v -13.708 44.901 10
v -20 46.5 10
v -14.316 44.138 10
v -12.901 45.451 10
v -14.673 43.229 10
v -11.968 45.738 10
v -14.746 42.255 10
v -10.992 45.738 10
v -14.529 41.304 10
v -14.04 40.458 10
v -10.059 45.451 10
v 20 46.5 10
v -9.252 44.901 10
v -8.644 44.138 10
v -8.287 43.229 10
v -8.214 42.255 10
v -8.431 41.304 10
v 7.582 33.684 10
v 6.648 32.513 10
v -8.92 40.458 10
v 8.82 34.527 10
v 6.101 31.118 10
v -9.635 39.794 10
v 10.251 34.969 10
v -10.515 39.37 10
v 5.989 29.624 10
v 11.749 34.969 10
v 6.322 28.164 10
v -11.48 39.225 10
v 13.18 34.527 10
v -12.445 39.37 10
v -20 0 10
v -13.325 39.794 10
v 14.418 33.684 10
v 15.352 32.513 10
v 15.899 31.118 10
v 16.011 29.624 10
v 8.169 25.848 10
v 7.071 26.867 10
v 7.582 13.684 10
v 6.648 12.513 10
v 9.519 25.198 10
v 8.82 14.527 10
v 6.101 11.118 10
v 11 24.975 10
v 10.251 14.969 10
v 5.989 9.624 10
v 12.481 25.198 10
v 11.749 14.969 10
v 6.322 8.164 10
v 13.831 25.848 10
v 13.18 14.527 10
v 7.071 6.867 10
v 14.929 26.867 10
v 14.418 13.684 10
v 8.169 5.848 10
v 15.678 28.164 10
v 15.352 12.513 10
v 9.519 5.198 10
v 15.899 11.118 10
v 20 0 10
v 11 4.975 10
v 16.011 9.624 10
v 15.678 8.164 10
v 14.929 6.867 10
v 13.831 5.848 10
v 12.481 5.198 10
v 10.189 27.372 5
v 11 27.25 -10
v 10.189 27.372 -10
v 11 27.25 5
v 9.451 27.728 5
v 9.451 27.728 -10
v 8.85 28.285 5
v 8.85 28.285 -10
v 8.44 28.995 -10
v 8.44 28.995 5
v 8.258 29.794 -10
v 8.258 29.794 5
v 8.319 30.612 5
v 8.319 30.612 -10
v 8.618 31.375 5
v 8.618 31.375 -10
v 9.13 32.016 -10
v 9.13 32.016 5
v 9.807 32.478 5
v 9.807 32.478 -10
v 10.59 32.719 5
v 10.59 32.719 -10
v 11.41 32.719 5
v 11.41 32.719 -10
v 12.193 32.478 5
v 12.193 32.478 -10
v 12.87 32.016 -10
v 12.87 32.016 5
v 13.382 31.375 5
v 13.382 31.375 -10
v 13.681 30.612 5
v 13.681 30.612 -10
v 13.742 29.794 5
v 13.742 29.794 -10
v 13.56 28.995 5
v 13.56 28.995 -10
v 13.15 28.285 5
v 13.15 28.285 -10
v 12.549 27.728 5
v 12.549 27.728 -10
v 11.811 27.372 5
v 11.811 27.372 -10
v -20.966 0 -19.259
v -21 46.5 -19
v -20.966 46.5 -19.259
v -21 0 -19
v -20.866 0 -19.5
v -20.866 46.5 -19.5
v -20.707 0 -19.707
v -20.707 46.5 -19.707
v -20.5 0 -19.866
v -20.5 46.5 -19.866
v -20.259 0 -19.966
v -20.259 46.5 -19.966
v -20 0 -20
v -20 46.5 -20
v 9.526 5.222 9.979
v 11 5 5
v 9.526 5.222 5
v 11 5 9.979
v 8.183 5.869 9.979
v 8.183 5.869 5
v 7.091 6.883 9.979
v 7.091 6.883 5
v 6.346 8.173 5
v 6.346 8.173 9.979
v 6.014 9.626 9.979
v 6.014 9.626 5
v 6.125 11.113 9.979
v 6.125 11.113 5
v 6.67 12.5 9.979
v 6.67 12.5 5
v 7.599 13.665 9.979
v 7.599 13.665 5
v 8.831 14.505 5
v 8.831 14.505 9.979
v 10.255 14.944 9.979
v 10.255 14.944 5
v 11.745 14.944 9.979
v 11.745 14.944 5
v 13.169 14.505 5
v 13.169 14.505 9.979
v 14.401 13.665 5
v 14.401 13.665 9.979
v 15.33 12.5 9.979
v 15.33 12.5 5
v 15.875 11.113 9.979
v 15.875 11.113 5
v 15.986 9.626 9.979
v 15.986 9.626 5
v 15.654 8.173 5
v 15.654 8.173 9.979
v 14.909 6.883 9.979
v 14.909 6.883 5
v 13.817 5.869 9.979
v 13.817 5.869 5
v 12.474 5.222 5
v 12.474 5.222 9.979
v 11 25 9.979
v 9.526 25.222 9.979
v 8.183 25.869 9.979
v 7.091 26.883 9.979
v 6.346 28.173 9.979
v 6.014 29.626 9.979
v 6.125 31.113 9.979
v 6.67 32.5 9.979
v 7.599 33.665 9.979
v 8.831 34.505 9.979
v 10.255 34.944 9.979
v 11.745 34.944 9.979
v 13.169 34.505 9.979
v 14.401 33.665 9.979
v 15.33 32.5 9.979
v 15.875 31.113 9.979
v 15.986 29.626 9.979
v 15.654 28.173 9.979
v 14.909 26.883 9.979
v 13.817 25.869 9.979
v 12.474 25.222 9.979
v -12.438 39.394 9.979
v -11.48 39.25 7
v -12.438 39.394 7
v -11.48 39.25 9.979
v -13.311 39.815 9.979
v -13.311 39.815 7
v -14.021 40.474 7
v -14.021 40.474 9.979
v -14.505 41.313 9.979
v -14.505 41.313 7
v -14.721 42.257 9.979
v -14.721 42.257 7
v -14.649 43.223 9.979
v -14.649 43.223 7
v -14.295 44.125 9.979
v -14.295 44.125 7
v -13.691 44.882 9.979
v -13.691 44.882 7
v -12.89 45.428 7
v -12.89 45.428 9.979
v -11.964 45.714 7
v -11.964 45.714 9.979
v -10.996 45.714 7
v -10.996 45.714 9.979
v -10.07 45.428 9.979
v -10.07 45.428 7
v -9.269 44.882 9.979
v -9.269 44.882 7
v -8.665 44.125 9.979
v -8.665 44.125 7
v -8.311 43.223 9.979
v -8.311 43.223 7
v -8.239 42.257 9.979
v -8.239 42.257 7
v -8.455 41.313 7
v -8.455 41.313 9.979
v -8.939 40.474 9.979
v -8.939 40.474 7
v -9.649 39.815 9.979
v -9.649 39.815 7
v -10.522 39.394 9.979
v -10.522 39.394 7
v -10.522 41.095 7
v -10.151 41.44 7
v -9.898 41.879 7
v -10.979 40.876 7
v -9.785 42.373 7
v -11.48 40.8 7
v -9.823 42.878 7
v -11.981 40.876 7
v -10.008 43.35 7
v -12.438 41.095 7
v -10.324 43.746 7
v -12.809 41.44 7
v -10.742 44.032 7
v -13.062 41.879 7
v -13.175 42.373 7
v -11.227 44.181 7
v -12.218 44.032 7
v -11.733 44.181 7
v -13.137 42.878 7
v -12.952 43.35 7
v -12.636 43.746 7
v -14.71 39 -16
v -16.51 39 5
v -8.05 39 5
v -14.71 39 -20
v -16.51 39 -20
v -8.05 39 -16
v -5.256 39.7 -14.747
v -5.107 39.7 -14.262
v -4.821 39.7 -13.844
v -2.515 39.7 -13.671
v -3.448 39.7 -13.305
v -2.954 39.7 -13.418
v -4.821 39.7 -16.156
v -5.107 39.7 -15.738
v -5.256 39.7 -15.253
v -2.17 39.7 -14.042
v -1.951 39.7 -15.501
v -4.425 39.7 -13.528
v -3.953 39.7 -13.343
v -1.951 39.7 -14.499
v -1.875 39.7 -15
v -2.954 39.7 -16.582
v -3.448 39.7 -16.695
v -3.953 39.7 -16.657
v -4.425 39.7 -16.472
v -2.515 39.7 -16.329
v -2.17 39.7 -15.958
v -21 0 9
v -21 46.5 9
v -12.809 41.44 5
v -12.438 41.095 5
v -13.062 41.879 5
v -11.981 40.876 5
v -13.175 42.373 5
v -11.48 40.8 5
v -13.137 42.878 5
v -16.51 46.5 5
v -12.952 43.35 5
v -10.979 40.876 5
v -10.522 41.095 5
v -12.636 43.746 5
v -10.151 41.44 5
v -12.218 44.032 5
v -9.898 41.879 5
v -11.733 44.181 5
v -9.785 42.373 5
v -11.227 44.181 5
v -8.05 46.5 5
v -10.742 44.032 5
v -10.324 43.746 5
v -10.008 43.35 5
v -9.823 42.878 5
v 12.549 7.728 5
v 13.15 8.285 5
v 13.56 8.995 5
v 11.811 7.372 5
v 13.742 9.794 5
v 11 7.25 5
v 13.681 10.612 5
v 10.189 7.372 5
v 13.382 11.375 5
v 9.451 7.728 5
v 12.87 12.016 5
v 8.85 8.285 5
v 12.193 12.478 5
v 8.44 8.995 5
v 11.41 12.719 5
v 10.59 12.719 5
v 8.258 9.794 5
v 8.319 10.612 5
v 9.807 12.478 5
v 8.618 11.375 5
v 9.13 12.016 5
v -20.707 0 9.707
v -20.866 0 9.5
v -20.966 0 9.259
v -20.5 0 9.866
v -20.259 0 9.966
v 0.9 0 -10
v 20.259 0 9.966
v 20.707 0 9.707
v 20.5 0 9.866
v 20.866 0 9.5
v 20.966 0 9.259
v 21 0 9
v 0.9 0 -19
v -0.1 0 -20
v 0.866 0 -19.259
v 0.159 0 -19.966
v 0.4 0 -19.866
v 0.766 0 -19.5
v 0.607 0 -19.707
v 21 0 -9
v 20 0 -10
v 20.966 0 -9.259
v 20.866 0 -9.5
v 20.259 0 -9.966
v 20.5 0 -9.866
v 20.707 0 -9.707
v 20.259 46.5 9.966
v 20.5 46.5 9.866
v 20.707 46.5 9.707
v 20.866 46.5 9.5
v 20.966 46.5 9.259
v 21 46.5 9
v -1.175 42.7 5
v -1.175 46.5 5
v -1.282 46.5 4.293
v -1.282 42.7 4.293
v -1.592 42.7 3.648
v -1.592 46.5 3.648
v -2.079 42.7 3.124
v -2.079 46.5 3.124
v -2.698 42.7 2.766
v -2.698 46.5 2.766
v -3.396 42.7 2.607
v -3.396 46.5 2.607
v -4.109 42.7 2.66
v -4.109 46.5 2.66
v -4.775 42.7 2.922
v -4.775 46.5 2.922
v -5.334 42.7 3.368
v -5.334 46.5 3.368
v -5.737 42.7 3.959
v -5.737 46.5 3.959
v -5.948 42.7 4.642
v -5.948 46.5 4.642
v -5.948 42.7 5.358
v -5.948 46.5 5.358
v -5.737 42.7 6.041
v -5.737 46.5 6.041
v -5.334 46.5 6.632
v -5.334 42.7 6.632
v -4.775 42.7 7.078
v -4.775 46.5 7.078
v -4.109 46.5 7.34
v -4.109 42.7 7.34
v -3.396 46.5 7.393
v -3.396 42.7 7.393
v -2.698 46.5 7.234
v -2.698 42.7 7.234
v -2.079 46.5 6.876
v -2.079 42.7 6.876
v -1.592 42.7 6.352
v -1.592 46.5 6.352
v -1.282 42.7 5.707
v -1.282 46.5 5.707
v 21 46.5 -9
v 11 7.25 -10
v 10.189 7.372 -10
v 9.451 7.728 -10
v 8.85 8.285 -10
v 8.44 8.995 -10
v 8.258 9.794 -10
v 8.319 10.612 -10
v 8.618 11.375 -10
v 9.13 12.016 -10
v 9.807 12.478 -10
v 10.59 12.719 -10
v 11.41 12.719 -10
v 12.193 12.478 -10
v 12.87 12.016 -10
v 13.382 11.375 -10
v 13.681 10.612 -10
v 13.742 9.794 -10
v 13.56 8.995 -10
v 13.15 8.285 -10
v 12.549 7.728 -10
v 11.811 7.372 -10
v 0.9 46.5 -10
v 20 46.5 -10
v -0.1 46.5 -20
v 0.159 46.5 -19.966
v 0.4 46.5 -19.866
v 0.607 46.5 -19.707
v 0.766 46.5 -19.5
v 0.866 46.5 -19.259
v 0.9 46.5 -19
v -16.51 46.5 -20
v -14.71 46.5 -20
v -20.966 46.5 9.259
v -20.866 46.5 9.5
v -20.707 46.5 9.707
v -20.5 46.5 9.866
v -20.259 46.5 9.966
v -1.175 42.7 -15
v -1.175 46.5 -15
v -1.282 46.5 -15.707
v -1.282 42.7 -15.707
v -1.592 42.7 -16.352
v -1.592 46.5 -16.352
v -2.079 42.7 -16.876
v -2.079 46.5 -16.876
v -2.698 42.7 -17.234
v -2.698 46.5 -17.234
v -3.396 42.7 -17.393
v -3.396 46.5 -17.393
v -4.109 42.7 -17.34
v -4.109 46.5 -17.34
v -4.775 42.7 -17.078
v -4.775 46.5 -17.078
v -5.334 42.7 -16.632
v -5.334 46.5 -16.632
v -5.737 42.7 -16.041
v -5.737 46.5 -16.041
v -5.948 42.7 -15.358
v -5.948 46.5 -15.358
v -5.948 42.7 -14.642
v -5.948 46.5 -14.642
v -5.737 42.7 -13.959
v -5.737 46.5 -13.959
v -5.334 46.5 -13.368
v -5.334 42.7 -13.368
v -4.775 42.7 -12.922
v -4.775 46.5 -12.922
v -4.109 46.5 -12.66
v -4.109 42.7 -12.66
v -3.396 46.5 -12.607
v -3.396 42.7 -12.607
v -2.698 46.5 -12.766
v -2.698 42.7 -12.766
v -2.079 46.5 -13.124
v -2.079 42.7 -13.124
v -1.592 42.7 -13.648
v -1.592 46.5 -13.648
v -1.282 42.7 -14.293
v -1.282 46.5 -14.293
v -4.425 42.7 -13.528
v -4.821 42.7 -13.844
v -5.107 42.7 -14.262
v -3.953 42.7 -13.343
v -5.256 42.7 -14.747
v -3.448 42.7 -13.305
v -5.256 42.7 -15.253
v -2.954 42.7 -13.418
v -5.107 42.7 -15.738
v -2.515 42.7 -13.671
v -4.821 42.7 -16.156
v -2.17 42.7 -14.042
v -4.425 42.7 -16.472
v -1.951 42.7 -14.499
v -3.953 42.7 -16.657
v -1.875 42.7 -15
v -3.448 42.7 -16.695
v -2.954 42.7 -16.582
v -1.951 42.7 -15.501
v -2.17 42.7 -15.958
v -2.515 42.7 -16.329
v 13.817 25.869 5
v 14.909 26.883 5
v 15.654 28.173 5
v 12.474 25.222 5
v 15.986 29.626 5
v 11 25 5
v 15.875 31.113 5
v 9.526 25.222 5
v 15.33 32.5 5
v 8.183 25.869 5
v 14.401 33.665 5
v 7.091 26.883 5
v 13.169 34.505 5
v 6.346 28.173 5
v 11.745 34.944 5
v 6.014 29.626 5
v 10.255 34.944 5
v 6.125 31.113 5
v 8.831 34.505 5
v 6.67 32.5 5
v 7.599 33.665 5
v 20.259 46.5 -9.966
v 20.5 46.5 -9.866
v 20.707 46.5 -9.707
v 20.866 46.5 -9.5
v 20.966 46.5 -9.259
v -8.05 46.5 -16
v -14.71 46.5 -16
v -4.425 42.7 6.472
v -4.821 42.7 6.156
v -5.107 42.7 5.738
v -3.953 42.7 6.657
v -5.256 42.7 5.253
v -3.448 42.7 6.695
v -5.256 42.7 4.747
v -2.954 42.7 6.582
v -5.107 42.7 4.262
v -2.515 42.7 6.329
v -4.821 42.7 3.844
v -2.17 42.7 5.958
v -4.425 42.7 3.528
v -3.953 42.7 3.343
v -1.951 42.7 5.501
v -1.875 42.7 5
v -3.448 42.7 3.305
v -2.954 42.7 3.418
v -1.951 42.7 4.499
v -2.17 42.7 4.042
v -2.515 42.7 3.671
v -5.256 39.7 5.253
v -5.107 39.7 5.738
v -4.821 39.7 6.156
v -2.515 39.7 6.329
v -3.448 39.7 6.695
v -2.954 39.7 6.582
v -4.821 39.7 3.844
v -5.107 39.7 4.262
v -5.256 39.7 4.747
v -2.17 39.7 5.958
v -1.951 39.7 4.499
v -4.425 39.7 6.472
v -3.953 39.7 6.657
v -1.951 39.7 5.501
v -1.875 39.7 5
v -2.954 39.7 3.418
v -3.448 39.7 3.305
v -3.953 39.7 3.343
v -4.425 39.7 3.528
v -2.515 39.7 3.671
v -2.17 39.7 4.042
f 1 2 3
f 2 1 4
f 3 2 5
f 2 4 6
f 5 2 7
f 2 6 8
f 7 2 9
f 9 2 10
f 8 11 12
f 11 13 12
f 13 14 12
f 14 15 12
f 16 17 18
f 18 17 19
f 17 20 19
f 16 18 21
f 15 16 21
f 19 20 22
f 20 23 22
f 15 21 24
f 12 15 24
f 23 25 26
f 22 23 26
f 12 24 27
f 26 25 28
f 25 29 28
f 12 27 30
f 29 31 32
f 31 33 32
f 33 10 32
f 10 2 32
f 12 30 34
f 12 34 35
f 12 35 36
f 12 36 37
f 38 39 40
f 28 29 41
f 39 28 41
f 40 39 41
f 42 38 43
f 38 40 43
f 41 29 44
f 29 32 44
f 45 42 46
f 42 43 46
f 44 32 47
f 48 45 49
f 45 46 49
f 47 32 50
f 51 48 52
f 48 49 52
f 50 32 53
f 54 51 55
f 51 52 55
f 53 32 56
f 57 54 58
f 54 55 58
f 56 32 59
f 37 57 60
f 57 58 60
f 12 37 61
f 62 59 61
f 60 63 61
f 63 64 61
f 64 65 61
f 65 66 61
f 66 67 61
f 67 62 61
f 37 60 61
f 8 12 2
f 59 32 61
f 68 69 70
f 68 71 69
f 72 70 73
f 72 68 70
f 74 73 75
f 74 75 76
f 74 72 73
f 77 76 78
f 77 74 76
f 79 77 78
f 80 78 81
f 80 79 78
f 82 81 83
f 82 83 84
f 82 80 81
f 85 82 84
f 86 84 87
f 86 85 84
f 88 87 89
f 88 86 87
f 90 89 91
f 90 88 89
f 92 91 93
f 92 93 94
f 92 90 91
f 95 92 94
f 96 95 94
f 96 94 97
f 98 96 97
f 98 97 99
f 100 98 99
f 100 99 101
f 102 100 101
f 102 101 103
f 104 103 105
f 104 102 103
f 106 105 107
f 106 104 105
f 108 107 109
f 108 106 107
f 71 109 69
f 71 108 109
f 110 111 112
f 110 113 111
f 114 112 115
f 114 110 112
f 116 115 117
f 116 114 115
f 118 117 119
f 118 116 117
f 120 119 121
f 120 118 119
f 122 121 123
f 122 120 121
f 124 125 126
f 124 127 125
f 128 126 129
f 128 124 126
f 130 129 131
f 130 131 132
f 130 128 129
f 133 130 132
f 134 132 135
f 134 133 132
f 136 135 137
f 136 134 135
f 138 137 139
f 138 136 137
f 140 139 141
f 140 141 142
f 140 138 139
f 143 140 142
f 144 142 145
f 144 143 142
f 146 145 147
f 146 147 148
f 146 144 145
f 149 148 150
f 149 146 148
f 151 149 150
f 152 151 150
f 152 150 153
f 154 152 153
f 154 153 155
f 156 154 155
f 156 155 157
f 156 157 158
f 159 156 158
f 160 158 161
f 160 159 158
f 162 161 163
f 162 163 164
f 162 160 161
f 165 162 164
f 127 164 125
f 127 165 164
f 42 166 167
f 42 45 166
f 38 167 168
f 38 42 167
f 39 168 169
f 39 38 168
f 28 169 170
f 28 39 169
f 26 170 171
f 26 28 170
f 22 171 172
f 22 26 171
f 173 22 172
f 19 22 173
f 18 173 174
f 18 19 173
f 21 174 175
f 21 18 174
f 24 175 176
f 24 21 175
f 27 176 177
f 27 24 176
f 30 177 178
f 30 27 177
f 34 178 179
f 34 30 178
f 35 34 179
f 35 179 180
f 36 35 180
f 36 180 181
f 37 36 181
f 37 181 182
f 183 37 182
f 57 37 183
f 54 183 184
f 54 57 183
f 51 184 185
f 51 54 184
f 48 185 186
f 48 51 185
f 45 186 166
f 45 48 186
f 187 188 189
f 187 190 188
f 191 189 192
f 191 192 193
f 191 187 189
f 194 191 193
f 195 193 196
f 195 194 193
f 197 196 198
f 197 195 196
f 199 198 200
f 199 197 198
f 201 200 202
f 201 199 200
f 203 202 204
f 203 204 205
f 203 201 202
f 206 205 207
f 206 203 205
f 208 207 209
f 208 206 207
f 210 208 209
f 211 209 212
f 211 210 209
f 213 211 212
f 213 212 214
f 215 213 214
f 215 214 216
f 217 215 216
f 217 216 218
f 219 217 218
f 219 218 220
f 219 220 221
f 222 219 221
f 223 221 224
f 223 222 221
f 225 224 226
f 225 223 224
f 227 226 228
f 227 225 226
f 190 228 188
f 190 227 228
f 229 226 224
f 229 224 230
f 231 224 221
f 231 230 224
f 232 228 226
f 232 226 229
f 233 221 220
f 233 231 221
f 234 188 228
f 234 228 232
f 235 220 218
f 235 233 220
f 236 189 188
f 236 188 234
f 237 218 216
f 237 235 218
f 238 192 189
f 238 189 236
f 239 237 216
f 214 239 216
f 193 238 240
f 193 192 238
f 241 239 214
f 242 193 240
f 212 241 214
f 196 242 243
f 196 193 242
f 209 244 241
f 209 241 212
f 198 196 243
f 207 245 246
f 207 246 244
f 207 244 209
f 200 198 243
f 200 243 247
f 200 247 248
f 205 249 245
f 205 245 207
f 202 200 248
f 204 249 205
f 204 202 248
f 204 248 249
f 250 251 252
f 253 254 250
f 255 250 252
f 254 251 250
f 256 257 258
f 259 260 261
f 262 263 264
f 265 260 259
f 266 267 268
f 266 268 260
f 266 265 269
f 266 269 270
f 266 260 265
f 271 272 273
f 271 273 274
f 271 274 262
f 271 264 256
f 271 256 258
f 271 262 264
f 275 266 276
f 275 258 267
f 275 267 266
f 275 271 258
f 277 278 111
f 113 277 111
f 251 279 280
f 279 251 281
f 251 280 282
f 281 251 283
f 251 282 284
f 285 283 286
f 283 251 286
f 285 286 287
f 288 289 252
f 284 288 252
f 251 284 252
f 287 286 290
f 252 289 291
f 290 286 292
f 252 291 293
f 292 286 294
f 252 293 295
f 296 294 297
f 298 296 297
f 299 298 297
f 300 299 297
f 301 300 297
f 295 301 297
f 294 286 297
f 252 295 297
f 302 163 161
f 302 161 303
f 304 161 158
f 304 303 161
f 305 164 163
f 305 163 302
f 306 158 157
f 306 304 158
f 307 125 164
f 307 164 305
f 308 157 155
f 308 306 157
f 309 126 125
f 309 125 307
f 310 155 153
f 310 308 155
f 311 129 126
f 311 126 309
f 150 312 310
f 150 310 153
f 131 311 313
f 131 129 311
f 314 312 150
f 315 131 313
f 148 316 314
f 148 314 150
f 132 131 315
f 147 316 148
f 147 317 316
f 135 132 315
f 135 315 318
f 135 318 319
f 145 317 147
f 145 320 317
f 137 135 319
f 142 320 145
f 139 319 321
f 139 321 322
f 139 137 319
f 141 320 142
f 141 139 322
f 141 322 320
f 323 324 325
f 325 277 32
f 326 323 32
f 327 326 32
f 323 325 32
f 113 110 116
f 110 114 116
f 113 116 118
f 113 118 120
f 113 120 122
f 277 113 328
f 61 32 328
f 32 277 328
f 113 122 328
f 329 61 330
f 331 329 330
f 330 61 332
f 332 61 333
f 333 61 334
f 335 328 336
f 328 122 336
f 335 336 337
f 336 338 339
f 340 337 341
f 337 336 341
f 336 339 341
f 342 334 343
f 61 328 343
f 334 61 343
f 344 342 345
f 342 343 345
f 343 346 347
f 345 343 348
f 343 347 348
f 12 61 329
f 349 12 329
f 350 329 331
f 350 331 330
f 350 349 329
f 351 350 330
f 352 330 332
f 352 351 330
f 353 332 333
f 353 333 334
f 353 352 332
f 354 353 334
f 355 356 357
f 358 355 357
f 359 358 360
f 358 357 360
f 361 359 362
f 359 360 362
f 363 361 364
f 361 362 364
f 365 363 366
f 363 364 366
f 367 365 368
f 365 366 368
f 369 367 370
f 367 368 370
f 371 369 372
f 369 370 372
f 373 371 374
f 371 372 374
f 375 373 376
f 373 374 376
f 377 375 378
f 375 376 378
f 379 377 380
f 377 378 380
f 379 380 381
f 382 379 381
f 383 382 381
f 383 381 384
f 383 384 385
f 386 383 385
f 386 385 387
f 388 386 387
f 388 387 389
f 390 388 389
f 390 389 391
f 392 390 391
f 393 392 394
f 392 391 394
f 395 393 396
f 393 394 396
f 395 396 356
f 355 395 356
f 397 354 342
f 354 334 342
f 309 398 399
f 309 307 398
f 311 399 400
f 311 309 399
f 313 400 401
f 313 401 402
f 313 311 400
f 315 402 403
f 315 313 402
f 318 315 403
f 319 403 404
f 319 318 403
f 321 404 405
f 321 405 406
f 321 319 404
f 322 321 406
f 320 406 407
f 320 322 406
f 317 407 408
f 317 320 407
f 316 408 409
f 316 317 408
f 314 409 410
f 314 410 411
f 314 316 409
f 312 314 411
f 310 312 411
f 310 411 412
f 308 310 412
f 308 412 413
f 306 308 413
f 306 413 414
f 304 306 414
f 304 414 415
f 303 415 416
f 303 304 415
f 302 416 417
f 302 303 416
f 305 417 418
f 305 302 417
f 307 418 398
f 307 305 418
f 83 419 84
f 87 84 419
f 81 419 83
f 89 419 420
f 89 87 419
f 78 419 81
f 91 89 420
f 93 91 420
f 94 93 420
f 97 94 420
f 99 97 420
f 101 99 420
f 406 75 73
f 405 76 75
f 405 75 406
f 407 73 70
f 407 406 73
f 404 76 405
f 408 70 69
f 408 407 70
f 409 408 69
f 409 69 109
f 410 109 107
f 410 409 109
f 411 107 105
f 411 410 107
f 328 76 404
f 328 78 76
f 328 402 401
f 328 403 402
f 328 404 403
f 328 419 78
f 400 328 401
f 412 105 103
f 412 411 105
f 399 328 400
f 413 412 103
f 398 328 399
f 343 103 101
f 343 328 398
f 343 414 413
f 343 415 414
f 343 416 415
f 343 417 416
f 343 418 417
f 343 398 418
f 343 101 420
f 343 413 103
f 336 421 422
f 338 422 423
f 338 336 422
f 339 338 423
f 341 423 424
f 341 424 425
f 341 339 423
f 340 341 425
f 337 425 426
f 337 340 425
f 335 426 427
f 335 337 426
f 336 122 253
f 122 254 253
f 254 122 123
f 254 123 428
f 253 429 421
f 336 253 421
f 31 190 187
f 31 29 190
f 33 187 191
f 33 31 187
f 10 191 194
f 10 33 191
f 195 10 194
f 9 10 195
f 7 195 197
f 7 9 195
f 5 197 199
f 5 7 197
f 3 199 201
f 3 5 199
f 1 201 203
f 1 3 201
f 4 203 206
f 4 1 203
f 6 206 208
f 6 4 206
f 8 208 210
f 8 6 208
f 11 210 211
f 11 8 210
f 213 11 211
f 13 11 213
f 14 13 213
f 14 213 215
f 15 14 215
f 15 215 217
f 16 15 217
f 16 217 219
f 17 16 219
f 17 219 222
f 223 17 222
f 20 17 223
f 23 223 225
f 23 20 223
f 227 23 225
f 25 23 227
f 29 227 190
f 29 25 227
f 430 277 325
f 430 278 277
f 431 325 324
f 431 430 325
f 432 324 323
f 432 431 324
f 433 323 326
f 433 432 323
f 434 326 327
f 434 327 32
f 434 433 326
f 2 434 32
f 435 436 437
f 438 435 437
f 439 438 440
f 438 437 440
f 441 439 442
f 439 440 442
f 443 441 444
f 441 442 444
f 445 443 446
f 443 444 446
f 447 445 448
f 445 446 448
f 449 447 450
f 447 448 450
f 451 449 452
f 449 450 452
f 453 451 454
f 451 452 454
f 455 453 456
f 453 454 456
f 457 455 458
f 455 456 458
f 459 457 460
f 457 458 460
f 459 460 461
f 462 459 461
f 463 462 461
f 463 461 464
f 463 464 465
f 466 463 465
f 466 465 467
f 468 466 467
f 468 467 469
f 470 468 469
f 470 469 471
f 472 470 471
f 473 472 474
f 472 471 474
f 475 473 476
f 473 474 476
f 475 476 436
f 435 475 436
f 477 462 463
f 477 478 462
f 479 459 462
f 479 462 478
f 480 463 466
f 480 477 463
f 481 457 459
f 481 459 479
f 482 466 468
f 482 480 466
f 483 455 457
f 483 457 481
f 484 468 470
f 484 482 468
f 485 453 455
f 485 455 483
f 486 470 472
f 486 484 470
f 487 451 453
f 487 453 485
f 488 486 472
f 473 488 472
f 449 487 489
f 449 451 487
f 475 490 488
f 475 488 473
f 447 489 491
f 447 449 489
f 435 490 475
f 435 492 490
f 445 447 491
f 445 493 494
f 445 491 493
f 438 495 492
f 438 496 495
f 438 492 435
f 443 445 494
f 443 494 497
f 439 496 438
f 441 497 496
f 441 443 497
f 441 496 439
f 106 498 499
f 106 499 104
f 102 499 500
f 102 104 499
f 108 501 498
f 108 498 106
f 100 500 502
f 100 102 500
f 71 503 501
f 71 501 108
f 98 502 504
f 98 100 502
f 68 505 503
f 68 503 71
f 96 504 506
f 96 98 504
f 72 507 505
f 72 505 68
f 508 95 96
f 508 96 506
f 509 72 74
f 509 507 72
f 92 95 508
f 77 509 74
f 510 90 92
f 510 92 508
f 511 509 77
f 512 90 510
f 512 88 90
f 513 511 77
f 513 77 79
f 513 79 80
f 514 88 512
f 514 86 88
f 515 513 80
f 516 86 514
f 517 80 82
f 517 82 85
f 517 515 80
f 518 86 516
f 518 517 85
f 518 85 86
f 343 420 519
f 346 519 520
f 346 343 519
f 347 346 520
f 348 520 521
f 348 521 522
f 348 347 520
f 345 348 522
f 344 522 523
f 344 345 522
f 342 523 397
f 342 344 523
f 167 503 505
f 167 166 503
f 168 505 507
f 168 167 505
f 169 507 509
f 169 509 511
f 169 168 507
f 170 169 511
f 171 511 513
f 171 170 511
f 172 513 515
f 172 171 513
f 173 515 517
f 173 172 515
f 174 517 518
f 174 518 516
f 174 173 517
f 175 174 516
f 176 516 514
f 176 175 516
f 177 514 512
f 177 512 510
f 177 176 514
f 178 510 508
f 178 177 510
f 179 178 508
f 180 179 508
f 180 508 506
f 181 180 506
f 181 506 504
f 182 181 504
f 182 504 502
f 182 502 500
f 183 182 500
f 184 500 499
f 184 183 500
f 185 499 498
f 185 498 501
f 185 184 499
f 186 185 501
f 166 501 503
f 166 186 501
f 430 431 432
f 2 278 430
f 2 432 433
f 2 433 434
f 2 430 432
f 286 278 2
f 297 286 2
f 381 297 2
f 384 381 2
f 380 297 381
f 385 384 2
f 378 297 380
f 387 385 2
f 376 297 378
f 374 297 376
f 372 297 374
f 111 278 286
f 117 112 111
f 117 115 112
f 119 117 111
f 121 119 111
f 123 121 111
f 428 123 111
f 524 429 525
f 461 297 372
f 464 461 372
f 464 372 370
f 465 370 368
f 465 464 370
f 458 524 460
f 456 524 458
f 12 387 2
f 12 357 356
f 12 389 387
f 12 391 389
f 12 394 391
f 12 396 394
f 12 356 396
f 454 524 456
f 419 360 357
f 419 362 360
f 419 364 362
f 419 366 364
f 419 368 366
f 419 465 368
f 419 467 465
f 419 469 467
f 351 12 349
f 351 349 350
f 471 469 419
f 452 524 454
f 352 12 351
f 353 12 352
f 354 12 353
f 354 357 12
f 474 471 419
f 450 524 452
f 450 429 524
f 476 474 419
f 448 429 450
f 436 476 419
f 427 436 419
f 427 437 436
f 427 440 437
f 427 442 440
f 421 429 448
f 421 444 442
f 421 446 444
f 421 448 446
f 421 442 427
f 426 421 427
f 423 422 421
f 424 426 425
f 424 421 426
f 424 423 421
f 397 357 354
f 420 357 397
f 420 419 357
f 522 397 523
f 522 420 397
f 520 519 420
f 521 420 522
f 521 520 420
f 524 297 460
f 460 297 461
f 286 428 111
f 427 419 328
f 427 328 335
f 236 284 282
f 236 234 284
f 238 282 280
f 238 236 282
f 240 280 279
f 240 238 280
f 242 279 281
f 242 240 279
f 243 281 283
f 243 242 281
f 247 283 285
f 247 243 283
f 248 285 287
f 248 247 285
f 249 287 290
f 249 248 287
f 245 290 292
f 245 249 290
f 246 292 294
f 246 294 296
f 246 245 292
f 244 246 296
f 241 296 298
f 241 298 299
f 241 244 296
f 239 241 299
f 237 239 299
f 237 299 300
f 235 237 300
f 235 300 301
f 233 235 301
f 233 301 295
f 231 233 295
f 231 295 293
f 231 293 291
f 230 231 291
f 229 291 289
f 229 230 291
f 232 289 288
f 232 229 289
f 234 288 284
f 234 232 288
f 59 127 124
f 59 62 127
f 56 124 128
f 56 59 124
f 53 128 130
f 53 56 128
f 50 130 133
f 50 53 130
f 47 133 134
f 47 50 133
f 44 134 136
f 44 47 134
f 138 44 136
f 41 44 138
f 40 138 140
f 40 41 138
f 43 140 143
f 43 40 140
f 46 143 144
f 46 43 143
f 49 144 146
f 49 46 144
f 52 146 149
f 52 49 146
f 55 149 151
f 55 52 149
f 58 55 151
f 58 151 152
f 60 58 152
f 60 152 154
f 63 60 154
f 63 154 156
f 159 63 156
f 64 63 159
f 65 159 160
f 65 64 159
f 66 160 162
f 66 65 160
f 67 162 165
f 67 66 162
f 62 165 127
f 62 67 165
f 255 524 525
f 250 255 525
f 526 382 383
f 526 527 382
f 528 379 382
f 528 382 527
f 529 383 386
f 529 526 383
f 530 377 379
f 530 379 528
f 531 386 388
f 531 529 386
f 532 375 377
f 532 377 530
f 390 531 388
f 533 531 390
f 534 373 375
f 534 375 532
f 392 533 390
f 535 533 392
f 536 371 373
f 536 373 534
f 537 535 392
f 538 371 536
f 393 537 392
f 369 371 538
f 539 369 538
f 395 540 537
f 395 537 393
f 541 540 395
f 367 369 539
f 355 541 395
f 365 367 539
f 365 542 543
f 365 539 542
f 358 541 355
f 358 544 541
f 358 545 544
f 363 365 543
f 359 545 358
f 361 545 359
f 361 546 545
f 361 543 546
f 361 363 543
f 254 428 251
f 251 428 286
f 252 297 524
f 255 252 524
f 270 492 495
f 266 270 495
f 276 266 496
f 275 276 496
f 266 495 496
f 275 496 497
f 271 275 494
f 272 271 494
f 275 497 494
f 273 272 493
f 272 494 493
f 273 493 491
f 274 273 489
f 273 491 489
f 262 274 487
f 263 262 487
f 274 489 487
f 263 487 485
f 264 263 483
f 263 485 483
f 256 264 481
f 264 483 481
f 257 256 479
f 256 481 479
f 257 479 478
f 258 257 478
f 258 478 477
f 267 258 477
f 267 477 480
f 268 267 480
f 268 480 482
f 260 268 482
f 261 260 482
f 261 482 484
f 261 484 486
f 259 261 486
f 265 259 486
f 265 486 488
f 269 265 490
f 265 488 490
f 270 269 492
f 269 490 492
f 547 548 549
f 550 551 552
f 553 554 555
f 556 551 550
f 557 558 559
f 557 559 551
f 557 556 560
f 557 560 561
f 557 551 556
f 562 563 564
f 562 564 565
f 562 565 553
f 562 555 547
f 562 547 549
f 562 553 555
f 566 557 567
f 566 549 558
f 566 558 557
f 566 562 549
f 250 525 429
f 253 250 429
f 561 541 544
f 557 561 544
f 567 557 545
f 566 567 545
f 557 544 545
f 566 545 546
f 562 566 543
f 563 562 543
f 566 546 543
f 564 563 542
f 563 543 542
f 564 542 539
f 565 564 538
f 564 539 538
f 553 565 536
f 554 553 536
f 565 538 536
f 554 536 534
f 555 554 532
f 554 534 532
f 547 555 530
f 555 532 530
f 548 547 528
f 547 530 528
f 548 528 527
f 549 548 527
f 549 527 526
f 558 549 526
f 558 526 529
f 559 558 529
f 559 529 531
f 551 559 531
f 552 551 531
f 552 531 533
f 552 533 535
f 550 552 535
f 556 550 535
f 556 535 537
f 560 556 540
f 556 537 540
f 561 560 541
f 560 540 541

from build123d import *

# Parameters (mm, degrees)
SKETCH1_W                     = 42
SKETCH1_H                     = 20
BOSS_EXTRUDE1_DEPTH           = 40
CBORE_FOR_M5_SHCS1_AT_2_COUNT = 2
CBORE_FOR_M5_SHCS1_AT_2_PITCH = 20
SKETCH5_W                     = 42
SKETCH5_H                     = 20
BOSS_EXTRUDE2_DEPTH           = 6.5
SKETCH12_W                    = 21.9
SKETCH12_H                    = 10
BOSS_EXTRUDE3_DEPTH           = 46.5
CUT_EXTRUDE1_DEPTH            = 7.5
FILLET1_R                     = 1
SKETCH14_R                    = 2.4
CUT_EXTRUDE2_DEPTH            = 3.8
SKETCH15_R                    = 1.7
CUT_EXTRUDE3_DEPTH            = 3


with BuildPart() as part:
    # Sketch1 → Boss-Extrude1 (new body)
    with BuildSketch(Plane(origin=(0, 0, 0), x_dir=(1, 0, 0), z_dir=(0, 1, 0))):
        Rectangle(SKETCH1_W, SKETCH1_H)
    extrude(amount=BOSS_EXTRUDE1_DEPTH)

    # Sketch4 → CBORE for M5 SHCS1 (revolve, cut)
    with BuildSketch(Plane(origin=(11, 30, 10), x_dir=(0, -1, 0), z_dir=(1, 0, 0))):
        Polygon((0, 0), (0, 20), (2.75, 20), (2.75, 5), (5, 5), (5, 0.020977491), (5.025, 0), align=None)
    cbore_for_m5_shcs1 = revolve(axis=Axis((11, 30, 16.35), (0, 0, -1)), mode=Mode.SUBTRACT)

    # CBORE for M5 SHCS1 at 2: CBORE for M5 SHCS1 ×2
    with Locations(*[(0, -i * CBORE_FOR_M5_SHCS1_AT_2_PITCH, 0) for i in range(1, CBORE_FOR_M5_SHCS1_AT_2_COUNT)]):
        add(cbore_for_m5_shcs1, mode=Mode.SUBTRACT)

    # Sketch5 → Boss-Extrude2 (add)
    with BuildSketch(Plane(origin=(0, 40, 0), x_dir=(1, 0, 0), z_dir=(0, 1, 0))):
        Rectangle(SKETCH5_W, SKETCH5_H)
    extrude(amount=BOSS_EXTRUDE2_DEPTH)

    # Sketch12 → Boss-Extrude3 (add)
    with BuildSketch(Plane(origin=(0, 46.5, 0), x_dir=(1, 0, 0), z_dir=(0, 1, 0))):
        with Locations((-10.05, 15)):
            Rectangle(SKETCH12_W, SKETCH12_H)
    extrude(amount=-BOSS_EXTRUDE3_DEPTH)

    # Sketch6 → Cut-Extrude1 (cut)
    with BuildSketch(Plane(origin=(0, 46.5, 0), x_dir=(1, 0, 0), z_dir=(0, 1, 0))):
        Polygon((-16.51, 20), (-16.51, -5), (-8.05, -5), (-8.05, 16), (-14.71, 16), (-14.71, 20), align=None)
    extrude(amount=-CUT_EXTRUDE1_DEPTH, mode=Mode.SUBTRACT)

    # Fillet1
    fillet1_edges = [part.edges().sort_by_distance(p)[0] for p in [
        (0.9, 23.25, -20),
        (-21, 23.25, -20),
        (21, 23.25, -10),
        (21, 23.25, 10),
        (-21, 23.25, 10),
    ]]
    fillet(fillet1_edges, radius=FILLET1_R)

    # Sketch11 → CBORE for M3 SHCS1 (revolve, cut)
    with BuildSketch(Plane(origin=(-11.48, 42.5, 10), x_dir=(0, -1, 0), z_dir=(1, 0, 0))):
        Polygon((0, 0), (0, 6.021463052), (1.7, 5), (1.7, 3), (3.25, 3), (3.25, 0.020977491), (3.275, 0), align=None)
    revolve(axis=Axis((-11.48, 42.5, 16.35), (0, 0, -1)), mode=Mode.SUBTRACT)

    # Sketch14 → Cut-Extrude2 (cut)
    with BuildSketch(Plane(origin=(0, 46.5, 0), x_dir=(1, 0, 0), z_dir=(0, 1, 0))):
        with Locations((-3.575, 15)):
            Circle(SKETCH14_R)
        with Locations((-3.575, -5)):
            Circle(SKETCH14_R)
    extrude(amount=-CUT_EXTRUDE2_DEPTH, mode=Mode.SUBTRACT)

    # Sketch15 → Cut-Extrude3 (cut)
    with BuildSketch(Plane(origin=(0, 42.7, 0), x_dir=(1, 0, 0), z_dir=(0, 1, 0))):
        with Locations((-3.575, 15)):
            Circle(SKETCH15_R)
        with Locations((-3.575, -5)):
            Circle(SKETCH15_R)
    extrude(amount=-CUT_EXTRUDE3_DEPTH, mode=Mode.SUBTRACT)


solid = part.part
